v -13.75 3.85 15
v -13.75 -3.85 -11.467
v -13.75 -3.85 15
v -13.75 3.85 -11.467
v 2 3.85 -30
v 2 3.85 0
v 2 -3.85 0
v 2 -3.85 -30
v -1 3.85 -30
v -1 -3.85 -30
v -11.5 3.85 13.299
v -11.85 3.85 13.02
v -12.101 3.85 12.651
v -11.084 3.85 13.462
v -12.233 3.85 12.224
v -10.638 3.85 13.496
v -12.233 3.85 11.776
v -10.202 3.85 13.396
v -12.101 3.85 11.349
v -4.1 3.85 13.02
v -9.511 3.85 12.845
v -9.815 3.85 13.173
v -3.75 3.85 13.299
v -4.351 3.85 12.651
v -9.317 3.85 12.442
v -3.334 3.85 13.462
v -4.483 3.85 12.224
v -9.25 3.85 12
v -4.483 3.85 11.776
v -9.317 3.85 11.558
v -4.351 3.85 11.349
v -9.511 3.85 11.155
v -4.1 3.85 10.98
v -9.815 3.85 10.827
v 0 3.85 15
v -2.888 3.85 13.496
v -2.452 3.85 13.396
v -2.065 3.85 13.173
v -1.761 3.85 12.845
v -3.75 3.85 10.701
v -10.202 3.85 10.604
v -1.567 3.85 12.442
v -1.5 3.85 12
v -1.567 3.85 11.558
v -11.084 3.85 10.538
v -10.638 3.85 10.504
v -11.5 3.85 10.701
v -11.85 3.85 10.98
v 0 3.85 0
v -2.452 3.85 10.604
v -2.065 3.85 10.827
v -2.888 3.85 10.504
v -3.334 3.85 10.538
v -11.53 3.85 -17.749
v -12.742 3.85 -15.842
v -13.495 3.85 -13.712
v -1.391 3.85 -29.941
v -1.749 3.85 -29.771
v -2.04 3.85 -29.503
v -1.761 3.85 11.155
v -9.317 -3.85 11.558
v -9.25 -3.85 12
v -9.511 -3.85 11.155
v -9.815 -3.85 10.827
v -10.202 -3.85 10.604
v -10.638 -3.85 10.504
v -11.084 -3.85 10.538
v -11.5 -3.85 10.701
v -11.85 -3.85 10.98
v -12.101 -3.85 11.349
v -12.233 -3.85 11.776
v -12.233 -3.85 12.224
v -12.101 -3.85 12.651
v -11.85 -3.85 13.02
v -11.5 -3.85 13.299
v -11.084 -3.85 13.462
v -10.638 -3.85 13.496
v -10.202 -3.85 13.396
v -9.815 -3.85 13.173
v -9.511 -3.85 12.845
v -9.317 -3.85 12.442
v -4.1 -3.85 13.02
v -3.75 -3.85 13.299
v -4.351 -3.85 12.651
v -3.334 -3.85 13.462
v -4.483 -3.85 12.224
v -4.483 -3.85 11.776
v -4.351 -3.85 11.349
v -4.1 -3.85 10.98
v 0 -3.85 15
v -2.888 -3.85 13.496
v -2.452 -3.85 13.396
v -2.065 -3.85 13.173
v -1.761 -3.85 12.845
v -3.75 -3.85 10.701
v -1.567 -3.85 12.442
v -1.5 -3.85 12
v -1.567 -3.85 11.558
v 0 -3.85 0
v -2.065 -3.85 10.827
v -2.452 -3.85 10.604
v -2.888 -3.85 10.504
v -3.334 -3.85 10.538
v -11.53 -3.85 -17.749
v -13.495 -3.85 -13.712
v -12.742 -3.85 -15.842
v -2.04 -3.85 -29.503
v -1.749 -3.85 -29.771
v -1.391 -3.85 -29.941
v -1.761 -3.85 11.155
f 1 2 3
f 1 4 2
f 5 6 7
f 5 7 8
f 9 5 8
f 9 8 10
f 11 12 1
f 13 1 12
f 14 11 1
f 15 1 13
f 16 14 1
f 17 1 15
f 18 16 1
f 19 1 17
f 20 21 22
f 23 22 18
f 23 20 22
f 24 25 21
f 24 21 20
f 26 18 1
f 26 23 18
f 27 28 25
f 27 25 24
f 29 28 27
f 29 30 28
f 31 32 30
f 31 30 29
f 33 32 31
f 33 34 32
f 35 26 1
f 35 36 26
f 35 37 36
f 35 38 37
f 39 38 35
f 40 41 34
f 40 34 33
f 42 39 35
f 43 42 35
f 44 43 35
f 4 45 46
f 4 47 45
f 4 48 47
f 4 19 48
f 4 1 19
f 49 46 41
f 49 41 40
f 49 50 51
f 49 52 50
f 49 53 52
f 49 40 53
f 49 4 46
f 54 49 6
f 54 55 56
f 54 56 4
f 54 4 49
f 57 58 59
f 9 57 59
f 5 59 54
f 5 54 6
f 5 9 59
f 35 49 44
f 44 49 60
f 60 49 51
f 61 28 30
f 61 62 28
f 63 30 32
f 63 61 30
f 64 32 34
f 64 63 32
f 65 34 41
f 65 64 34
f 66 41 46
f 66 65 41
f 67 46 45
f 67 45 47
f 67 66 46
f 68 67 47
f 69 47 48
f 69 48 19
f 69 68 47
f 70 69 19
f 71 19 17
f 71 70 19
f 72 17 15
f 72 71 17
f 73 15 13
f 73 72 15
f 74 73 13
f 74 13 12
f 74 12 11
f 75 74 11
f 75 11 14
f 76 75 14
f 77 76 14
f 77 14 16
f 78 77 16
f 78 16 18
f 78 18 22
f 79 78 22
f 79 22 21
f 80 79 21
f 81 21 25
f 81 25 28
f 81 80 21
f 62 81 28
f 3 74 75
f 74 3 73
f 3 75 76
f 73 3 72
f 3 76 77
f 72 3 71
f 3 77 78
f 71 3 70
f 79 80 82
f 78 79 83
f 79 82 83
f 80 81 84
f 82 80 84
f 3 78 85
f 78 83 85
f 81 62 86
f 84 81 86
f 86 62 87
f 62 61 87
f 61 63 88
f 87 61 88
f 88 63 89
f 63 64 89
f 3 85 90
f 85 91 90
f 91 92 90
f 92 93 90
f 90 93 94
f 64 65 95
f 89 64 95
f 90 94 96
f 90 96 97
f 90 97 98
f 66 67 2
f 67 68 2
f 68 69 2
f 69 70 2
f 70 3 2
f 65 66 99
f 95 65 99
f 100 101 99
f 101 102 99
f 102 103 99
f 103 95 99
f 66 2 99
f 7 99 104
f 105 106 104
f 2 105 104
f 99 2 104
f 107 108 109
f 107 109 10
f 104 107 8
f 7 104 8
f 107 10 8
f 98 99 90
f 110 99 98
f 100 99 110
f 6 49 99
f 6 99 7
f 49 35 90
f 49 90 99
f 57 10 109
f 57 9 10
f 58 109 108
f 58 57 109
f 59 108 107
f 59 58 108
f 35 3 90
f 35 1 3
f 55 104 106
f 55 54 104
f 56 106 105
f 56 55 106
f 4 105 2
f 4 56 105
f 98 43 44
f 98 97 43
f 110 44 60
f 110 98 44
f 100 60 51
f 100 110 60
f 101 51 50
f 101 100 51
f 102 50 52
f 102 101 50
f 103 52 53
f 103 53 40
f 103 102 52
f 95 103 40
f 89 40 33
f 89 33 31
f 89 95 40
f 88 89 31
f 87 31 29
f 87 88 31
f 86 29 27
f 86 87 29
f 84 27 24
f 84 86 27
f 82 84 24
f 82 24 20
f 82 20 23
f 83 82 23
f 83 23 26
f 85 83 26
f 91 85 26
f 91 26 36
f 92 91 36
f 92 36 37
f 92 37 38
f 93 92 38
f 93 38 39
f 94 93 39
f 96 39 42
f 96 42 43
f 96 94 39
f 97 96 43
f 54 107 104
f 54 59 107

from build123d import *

# Parameters (mm, degrees)
SKETCH1_R           = 1.5
BOSS_EXTRUDE3_DEPTH = 3.85


with BuildPart() as part:
    # Sketch1 → Boss-Extrude3 (new body, symmetric)
    with BuildSketch(Plane(origin=(0, 0, 0), x_dir=(1, 0, 0), z_dir=(0, 1, 0))):
        with BuildLine():
            Line((-13.75, -15), (0, -15))
            Line((0, -15), (0, 0))
            Line((0, 0), (2, 0))
            Line((2, 0), (2, 30))
            Line((2, 30), (-1, 30))
            ThreePointArc((-1, 30), (-1.576352013, 29.869367868), (-2.040057994, 29.503003078))
            Line((-2.040057994, 29.503003078), (-11.530466398, 17.748937838))
            ThreePointArc((-11.530466398, 17.748937838), (-13.178803317, 14.798188939), (-13.75, 11.466872681))
            Line((-13.75, 11.466872681), (-13.75, -15))
        make_face()
        with Locations((-10.75, -12)):
            Circle(SKETCH1_R, mode=Mode.SUBTRACT)
        with Locations((-3, -12)):
            Circle(SKETCH1_R, mode=Mode.SUBTRACT)
    extrude(amount=BOSS_EXTRUDE3_DEPTH, both=True)


solid = part.part
